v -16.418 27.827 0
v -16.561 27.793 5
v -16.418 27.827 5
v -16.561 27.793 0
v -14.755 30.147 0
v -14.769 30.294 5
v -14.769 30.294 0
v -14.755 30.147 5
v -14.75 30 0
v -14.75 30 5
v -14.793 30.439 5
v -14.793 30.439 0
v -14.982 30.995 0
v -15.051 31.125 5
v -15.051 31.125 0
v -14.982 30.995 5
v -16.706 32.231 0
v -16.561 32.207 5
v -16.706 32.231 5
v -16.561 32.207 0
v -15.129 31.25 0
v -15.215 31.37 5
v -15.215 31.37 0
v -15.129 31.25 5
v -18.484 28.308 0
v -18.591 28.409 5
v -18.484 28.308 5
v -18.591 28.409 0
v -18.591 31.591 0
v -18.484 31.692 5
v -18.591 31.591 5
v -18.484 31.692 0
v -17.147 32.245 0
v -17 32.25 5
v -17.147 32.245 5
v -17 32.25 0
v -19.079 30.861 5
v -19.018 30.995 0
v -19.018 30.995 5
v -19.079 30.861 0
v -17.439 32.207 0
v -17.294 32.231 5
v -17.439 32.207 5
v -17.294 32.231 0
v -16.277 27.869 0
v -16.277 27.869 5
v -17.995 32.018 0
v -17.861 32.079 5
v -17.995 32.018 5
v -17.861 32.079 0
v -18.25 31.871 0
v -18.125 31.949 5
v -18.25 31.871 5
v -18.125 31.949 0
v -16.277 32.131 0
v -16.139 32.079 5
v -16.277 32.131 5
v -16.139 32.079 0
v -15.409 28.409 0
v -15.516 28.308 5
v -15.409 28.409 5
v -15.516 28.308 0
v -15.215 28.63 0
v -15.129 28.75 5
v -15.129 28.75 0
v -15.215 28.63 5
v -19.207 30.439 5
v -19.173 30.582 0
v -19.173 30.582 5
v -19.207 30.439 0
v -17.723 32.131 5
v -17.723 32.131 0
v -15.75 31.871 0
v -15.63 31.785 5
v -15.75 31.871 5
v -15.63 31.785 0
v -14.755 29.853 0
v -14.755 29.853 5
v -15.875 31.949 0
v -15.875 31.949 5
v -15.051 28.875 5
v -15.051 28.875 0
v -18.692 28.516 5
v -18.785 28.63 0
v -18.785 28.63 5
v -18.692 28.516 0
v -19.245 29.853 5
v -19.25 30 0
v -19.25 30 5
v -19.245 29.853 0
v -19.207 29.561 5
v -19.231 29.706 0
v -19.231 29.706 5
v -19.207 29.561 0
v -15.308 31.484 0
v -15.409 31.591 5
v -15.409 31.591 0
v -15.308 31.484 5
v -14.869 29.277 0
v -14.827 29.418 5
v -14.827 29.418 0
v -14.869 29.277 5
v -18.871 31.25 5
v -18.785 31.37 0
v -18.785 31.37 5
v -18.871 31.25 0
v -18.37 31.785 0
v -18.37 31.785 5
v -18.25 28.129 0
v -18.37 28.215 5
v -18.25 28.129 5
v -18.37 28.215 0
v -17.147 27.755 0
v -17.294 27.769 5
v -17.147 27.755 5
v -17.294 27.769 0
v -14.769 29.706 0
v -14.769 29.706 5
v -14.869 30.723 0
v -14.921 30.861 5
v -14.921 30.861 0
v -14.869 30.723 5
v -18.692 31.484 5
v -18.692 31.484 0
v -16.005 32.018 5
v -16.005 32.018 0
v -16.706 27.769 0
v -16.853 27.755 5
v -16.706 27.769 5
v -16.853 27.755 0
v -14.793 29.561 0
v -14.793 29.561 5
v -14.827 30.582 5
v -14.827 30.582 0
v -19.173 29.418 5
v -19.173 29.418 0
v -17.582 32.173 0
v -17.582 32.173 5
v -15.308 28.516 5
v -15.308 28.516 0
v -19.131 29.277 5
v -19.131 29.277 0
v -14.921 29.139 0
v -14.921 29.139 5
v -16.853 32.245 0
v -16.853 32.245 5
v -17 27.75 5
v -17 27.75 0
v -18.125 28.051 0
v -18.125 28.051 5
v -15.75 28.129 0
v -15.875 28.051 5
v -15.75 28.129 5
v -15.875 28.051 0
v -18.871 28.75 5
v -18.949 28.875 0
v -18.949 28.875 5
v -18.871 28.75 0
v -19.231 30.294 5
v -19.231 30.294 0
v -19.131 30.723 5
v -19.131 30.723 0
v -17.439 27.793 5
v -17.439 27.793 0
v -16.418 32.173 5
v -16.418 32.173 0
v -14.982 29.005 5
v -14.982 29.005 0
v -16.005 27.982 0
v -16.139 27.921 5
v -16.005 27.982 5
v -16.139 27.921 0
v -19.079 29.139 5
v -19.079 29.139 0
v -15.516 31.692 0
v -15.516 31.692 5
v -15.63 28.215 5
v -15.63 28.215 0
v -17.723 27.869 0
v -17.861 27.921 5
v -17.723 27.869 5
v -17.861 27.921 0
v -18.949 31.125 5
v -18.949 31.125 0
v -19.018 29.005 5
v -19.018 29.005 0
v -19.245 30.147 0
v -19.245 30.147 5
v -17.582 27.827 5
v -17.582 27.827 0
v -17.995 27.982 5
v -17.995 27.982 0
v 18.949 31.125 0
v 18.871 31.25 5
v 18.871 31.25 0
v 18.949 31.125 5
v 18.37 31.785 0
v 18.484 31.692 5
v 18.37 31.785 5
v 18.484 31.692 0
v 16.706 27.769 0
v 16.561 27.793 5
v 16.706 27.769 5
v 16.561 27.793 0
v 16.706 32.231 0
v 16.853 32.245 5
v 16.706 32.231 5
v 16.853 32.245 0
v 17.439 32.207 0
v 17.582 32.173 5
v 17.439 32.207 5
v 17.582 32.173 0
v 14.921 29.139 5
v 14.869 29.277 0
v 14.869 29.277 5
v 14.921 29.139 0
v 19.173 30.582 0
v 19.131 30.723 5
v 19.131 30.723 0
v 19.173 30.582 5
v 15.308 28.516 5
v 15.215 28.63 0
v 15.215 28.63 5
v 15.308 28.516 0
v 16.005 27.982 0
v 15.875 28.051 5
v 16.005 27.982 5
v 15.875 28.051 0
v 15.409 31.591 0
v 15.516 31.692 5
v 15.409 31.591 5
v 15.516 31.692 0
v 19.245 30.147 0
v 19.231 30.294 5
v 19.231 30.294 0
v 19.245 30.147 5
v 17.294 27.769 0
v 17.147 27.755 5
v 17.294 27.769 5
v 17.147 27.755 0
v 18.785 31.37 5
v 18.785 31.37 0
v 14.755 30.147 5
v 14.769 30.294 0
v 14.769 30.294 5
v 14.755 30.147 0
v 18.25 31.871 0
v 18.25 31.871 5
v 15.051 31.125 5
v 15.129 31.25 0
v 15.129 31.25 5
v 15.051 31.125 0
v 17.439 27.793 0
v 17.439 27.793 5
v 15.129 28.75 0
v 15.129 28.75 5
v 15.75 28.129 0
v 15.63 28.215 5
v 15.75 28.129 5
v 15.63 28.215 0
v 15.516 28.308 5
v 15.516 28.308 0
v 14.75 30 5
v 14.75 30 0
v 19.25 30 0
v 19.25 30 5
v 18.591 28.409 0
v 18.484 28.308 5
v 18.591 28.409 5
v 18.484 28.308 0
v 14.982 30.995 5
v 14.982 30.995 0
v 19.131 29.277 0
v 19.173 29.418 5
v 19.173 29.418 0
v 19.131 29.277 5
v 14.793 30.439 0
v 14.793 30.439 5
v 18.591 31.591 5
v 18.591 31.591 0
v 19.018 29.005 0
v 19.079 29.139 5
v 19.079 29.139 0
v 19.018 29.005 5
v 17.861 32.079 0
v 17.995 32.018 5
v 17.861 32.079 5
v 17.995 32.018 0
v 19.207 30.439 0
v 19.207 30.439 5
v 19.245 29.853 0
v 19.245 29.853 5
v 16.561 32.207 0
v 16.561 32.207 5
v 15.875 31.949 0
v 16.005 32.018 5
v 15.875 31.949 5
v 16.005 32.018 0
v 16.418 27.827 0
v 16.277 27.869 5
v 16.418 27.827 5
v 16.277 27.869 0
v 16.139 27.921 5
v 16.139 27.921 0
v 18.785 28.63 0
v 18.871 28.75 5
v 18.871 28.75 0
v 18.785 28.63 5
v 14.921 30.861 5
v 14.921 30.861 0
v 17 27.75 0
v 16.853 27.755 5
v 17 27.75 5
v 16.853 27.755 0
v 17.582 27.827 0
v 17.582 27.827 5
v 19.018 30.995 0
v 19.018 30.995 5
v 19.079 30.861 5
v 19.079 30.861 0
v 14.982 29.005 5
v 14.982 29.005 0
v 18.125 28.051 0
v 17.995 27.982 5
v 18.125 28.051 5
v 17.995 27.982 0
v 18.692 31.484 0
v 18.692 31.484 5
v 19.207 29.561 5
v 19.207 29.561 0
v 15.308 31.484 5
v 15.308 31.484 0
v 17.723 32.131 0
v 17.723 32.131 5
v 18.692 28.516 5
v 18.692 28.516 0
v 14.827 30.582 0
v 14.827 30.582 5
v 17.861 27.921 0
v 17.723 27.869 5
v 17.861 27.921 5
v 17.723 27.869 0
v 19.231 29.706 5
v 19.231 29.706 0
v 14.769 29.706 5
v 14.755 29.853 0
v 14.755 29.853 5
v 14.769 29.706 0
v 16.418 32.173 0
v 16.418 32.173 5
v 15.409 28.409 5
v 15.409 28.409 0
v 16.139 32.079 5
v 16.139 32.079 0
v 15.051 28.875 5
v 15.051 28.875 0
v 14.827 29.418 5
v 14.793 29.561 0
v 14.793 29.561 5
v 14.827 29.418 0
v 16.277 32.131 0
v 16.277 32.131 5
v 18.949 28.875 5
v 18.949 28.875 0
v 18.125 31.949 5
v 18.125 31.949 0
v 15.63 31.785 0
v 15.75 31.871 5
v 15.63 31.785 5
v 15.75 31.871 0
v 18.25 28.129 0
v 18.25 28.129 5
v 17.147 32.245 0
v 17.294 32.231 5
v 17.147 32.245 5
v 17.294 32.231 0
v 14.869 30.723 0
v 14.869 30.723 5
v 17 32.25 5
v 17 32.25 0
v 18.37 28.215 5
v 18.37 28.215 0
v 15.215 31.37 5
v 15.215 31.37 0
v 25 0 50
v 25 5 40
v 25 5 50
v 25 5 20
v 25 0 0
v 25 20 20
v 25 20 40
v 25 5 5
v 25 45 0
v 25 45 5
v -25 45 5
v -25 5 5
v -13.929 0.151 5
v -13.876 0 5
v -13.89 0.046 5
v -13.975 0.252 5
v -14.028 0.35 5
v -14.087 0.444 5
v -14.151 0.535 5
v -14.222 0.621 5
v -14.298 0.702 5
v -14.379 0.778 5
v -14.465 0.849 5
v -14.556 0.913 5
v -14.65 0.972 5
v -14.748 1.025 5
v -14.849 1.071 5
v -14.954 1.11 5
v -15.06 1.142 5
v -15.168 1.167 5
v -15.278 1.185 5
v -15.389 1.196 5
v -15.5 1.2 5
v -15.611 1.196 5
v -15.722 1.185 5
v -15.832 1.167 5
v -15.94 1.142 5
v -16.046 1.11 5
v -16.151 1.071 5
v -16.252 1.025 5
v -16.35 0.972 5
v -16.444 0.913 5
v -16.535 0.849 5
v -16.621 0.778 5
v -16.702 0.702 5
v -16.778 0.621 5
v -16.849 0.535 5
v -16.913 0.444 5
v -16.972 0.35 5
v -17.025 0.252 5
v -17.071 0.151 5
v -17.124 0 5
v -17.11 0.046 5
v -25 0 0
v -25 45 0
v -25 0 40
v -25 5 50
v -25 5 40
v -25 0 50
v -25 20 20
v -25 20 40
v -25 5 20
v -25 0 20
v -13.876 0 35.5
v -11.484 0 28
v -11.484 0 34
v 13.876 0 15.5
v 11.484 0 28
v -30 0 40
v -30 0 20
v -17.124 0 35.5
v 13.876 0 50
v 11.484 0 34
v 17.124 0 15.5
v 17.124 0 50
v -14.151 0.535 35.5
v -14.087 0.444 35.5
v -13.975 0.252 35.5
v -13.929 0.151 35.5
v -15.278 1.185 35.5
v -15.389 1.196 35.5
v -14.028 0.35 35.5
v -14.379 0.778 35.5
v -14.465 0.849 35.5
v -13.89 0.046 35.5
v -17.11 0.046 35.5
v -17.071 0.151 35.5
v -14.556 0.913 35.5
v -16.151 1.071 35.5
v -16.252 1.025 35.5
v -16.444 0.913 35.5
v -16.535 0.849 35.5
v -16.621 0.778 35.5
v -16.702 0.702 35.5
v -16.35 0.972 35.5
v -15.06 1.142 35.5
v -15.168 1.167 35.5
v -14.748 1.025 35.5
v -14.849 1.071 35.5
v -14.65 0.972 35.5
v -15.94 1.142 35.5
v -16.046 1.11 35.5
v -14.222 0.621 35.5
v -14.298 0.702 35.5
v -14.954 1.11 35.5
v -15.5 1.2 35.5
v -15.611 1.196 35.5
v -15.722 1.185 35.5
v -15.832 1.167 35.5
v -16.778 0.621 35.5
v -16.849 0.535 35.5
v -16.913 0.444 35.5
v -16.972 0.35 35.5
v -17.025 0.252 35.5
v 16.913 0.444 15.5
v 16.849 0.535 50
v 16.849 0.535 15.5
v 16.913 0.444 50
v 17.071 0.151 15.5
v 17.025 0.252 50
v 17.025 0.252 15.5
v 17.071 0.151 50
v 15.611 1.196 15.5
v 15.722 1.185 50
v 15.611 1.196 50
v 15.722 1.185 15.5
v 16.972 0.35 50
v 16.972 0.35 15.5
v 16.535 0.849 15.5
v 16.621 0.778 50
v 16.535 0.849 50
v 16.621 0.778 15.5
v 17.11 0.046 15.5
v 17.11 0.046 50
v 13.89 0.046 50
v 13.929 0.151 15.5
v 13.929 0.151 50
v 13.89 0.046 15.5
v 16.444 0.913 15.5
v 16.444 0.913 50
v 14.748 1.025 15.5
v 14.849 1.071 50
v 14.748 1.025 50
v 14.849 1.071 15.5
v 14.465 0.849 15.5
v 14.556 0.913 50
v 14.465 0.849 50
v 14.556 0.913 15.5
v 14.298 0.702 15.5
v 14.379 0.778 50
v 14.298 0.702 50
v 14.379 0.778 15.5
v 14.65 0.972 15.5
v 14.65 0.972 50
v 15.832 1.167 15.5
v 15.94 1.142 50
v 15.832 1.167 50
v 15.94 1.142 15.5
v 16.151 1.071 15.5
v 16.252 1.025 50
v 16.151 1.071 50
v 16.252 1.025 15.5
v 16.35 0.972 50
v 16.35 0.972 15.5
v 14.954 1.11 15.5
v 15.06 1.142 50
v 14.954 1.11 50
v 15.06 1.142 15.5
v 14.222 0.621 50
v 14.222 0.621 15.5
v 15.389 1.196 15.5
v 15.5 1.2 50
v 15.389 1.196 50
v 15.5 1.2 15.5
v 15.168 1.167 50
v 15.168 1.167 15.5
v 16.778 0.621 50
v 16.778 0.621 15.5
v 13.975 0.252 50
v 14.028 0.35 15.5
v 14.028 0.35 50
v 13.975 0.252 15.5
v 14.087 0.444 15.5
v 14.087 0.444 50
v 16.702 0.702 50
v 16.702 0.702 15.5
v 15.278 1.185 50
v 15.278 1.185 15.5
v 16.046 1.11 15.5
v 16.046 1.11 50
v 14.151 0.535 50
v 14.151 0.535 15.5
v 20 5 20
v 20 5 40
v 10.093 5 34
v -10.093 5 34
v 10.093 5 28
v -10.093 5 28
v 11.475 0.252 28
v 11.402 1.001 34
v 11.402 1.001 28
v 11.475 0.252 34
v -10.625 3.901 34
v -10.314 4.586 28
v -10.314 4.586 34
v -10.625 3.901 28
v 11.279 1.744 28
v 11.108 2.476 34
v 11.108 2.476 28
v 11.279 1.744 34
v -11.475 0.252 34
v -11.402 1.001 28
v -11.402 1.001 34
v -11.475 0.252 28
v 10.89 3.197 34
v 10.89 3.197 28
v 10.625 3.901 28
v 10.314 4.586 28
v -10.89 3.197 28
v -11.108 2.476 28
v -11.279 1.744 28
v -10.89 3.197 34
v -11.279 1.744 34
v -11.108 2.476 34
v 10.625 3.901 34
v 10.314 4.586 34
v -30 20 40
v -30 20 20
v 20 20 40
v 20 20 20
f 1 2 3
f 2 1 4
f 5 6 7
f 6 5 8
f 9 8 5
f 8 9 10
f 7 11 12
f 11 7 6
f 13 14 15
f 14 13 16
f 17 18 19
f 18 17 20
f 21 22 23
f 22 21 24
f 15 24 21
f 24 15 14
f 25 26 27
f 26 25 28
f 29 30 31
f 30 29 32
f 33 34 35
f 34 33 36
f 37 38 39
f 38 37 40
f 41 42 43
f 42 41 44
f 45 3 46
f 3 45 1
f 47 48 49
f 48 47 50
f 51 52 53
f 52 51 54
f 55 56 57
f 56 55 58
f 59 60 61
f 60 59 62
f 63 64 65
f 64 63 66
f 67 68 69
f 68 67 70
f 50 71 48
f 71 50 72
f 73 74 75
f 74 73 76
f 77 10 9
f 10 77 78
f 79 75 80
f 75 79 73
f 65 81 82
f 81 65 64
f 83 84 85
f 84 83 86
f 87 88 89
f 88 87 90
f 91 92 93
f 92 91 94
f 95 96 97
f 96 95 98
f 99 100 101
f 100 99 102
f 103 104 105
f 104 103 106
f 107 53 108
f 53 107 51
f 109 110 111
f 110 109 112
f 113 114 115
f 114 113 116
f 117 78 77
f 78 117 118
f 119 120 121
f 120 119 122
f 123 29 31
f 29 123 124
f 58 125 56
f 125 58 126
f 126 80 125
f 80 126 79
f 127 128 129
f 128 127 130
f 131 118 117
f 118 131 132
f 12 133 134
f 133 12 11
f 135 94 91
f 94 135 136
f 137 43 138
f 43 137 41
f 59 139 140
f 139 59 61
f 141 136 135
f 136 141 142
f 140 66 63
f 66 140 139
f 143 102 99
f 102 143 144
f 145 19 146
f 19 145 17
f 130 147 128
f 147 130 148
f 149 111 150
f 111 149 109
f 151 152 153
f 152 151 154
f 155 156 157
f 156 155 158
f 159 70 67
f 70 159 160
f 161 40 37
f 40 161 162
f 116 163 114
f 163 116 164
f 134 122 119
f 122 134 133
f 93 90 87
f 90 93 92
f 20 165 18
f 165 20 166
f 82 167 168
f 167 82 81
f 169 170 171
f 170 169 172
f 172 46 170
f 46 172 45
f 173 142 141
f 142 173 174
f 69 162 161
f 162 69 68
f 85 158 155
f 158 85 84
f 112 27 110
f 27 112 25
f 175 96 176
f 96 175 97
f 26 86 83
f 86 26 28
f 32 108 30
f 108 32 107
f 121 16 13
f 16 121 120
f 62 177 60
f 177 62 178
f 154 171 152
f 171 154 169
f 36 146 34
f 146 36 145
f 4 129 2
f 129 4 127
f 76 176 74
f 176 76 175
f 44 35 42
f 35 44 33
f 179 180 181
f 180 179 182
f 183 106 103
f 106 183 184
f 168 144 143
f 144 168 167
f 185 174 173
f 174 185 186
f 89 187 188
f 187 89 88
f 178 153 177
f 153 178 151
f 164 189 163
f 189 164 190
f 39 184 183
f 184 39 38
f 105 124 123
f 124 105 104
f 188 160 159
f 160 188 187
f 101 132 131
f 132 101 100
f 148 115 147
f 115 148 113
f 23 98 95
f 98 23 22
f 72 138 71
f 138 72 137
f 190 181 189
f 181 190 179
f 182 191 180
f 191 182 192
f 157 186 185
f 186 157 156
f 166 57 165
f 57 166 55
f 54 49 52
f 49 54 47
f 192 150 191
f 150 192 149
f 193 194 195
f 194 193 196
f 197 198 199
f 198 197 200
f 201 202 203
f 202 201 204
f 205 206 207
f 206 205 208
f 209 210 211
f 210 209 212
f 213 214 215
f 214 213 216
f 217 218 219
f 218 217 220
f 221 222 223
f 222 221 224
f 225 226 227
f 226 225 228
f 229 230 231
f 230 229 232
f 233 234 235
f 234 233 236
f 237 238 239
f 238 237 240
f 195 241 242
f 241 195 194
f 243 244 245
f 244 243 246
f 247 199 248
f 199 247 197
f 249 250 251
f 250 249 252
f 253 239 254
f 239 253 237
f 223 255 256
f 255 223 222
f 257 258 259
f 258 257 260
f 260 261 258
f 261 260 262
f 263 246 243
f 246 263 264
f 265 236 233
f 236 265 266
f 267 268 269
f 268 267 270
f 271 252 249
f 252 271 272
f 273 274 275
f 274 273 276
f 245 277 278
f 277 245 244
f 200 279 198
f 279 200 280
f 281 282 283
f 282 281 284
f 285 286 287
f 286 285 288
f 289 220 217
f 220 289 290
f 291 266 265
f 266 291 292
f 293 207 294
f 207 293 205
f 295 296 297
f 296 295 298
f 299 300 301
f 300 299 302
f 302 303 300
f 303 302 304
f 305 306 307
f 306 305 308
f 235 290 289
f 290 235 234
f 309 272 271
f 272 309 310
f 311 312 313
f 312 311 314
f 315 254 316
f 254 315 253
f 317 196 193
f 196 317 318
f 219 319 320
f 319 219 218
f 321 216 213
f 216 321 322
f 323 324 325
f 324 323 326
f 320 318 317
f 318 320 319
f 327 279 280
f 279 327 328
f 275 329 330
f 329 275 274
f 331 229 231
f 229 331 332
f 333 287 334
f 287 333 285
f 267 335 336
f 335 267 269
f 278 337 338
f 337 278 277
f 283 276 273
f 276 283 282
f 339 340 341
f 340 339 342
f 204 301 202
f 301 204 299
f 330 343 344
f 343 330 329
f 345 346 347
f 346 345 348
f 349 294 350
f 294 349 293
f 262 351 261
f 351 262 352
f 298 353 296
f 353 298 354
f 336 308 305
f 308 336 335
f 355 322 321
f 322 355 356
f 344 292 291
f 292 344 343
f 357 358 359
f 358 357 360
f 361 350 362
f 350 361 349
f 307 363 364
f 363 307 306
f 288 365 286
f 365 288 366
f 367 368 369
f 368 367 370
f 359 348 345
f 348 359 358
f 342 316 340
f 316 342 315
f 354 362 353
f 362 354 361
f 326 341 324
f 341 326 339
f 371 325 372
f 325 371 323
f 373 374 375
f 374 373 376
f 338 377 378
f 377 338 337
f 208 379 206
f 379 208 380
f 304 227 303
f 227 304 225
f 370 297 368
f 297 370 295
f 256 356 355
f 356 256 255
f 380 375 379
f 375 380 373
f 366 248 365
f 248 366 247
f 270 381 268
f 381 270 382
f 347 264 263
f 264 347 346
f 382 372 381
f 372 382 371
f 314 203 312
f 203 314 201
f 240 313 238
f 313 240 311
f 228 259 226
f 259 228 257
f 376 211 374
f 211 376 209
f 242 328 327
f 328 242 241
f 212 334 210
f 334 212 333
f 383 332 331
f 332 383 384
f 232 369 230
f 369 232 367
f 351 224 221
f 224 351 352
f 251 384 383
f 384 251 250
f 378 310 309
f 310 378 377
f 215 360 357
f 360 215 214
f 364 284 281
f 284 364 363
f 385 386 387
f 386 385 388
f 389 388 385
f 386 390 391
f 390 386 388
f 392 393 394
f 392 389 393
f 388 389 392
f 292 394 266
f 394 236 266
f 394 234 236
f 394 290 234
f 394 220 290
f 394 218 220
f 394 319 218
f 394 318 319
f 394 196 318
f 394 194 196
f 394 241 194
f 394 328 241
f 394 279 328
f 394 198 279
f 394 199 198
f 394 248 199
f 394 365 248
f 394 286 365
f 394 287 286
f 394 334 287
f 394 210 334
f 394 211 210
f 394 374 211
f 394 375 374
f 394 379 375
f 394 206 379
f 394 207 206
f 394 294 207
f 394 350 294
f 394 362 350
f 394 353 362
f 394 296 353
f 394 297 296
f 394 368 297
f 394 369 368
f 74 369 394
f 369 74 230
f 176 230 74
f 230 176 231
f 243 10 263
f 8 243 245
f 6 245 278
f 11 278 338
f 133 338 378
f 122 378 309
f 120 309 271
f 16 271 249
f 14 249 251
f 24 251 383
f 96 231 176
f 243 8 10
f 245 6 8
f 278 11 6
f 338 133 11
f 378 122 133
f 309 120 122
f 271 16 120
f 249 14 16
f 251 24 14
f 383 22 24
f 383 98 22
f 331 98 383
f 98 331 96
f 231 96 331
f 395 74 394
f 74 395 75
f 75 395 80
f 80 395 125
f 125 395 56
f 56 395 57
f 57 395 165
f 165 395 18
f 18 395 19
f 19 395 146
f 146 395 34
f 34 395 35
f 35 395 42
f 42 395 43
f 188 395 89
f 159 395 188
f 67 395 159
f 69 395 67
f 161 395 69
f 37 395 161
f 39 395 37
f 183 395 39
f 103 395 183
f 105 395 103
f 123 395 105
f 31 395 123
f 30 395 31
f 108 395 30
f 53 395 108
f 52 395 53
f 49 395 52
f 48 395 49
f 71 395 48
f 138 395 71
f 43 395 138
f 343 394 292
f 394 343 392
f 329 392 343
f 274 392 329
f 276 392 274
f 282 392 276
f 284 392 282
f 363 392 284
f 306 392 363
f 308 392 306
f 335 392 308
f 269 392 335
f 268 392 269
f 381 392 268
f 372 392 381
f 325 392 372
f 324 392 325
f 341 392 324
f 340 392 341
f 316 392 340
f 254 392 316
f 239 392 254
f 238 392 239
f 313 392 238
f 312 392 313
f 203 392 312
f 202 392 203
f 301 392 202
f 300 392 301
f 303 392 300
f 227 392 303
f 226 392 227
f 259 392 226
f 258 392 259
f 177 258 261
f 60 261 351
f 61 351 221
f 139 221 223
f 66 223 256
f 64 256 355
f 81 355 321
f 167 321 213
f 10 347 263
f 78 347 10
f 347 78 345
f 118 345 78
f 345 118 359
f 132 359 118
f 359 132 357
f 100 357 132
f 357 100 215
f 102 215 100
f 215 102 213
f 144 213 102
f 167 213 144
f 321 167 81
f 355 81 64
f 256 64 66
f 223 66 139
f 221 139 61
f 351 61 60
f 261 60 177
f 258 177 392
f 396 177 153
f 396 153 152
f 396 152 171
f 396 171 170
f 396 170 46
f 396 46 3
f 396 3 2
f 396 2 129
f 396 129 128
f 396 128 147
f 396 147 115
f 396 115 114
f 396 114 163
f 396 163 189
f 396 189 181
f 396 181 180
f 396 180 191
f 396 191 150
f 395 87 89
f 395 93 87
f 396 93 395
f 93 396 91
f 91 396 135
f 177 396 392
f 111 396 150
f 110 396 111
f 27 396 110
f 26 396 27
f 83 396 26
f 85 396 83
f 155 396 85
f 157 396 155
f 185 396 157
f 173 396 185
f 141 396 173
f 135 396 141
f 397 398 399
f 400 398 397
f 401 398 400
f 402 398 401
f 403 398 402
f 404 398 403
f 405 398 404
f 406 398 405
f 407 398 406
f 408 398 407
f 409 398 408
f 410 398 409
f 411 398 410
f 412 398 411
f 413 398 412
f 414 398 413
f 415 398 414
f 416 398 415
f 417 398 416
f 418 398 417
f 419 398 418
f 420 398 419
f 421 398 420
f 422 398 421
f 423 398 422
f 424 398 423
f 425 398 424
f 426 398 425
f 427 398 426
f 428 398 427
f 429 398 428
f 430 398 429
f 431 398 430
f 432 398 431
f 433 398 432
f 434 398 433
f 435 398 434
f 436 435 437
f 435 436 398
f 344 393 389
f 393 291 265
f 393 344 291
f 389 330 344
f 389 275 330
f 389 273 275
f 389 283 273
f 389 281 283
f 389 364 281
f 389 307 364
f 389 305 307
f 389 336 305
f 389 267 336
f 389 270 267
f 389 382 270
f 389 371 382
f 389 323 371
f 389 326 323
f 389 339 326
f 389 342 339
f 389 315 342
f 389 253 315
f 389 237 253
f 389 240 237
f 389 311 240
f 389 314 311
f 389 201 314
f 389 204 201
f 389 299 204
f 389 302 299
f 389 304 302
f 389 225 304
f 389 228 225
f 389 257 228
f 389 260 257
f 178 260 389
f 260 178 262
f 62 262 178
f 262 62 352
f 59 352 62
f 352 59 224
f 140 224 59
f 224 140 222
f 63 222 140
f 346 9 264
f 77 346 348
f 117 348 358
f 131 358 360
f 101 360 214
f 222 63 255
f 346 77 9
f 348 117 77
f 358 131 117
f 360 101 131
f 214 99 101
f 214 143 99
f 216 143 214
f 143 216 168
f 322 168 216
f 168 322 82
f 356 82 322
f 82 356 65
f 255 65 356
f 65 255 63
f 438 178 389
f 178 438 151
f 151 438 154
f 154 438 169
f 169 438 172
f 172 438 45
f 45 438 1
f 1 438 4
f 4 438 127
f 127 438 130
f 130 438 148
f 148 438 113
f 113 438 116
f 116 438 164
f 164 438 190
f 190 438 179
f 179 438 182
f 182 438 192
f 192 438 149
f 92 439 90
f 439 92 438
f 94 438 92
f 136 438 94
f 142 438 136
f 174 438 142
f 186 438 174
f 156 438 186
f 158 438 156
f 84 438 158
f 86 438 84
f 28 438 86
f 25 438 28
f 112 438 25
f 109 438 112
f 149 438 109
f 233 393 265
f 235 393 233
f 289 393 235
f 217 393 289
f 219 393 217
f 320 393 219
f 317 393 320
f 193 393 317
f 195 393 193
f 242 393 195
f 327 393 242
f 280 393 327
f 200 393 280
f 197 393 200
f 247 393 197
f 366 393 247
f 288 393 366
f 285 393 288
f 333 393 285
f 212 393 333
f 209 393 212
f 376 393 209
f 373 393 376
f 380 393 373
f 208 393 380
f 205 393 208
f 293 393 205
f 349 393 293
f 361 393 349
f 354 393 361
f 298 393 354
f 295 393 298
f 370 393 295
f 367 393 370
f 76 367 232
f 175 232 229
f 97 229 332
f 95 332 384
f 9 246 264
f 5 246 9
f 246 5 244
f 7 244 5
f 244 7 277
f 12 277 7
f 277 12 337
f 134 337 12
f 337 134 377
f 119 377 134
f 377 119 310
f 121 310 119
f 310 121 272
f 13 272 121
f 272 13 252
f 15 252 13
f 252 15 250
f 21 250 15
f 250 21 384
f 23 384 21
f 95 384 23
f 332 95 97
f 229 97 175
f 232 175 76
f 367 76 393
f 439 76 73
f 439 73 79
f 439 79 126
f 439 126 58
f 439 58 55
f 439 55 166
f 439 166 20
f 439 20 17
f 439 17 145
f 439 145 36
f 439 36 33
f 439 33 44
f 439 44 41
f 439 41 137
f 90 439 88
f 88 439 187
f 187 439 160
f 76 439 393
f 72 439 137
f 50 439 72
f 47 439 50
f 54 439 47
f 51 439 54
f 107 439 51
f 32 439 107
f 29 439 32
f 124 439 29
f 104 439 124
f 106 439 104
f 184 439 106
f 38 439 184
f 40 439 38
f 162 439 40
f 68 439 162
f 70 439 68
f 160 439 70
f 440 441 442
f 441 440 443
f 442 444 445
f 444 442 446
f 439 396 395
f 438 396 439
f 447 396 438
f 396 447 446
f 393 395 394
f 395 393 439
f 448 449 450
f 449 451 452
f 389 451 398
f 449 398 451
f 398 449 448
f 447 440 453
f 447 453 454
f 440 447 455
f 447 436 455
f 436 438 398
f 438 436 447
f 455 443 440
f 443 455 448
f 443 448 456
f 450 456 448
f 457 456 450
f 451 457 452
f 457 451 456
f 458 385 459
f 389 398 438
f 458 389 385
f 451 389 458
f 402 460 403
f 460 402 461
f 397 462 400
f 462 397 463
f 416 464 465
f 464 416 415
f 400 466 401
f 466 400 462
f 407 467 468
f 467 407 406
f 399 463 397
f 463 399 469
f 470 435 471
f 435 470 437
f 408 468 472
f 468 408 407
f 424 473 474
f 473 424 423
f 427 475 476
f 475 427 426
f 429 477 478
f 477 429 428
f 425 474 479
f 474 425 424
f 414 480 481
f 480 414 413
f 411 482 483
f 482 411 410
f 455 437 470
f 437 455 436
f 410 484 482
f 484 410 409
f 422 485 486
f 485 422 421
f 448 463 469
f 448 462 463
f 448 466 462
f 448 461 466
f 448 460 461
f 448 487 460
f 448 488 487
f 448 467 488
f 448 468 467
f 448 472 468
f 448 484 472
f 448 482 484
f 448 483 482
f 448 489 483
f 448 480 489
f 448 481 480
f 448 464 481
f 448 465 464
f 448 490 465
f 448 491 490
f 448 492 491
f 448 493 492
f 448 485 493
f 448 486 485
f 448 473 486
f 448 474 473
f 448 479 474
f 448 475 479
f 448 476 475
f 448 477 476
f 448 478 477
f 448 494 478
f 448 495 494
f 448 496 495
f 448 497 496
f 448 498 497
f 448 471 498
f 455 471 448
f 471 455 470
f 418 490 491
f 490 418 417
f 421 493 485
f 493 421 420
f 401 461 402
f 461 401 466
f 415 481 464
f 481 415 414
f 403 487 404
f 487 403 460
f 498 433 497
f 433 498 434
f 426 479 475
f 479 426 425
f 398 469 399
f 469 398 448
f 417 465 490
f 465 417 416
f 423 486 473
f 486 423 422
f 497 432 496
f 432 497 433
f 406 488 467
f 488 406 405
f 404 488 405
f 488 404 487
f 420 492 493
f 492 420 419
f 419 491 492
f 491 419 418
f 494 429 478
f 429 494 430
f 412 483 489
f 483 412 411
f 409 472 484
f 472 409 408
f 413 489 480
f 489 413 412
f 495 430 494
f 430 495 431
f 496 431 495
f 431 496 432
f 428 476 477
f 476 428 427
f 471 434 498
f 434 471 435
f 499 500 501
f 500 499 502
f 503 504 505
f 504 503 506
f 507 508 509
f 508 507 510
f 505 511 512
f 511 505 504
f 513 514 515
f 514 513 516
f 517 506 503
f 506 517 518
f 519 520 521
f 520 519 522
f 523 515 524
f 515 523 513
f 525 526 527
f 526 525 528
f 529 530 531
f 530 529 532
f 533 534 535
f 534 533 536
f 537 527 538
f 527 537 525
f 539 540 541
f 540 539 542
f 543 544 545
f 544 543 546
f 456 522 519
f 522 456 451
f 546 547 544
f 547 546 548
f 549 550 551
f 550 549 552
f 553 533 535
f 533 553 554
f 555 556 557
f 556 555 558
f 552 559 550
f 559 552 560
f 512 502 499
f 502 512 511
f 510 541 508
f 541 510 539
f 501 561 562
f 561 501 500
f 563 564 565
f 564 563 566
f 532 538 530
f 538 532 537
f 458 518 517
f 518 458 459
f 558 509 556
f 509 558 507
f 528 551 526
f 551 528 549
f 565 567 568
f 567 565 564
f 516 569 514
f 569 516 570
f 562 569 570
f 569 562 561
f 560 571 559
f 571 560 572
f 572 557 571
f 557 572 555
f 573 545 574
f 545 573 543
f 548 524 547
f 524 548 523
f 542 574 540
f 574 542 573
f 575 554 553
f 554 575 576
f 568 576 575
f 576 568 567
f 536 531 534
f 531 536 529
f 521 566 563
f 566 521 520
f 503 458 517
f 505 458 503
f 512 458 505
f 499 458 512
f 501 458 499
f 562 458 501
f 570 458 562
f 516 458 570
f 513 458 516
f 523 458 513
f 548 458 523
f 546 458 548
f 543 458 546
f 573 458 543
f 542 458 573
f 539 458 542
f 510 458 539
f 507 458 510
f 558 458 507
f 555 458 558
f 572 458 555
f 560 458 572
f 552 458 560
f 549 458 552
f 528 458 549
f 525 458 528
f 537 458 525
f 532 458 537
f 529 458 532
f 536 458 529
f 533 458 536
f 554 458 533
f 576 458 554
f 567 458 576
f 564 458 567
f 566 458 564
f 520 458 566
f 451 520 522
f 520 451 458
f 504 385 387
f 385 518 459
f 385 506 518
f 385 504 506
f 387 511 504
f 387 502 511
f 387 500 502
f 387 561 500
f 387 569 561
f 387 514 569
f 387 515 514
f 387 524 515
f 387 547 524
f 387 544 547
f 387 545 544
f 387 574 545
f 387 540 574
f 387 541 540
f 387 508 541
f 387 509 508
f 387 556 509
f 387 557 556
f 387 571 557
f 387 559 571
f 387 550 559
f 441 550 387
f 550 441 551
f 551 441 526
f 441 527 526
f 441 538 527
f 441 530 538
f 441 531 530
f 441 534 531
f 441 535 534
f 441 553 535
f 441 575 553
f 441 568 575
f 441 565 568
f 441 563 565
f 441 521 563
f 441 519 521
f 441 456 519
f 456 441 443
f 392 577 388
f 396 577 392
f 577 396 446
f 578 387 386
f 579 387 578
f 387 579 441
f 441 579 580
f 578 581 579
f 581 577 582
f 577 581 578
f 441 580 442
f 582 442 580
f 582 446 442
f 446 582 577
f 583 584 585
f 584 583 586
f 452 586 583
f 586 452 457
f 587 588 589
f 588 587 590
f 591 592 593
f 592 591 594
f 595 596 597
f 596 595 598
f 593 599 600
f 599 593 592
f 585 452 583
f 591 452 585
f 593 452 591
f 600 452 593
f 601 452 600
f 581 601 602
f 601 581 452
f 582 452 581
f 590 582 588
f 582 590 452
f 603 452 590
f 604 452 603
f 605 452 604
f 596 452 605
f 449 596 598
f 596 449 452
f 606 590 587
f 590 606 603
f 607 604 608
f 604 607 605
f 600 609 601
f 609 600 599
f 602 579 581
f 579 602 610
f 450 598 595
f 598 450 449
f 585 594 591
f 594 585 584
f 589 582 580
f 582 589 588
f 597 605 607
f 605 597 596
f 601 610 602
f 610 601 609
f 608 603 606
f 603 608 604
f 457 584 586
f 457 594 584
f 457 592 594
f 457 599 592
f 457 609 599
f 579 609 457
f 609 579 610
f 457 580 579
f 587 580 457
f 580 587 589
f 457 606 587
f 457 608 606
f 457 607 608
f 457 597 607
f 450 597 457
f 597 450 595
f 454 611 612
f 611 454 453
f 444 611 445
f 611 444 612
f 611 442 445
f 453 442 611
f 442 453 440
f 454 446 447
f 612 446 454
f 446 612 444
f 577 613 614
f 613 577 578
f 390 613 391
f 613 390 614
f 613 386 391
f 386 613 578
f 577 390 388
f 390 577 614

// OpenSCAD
// L-shaped mounting bracket for NEMA 17 stepper motor (e.g. syringe pump)
// Print orientation: base plate on the bed, motor plate building upward.

// ---------------- Parameters ----------------
base_x0      = -25;   // base plate, x start (mm)
base_x1      = 25;    // base plate, x end (mm)
base_y0      = 0;     // base plate, y start (mm)
base_y1      = 45;    // base plate, y end (mm)
base_z0      = 0;     // base plate, z start (mm)
base_z1      = 5;     // base plate, z end (mm)

hole_m4_x    = -17;   // M4 through-hole, x position (mm)
hole_m4_y    = 30;    // M4 through-hole, y position (mm)
hole_m4_d    = 4.5;   // M4 through-hole diameter (mm)

hole_m4_x2   = 17;    // M4 through-hole, x position (mm)
hole_m4_y2   = 30;    // M4 through-hole, y position (mm)
hole_m4_d2   = 4.5;   // M4 through-hole diameter (mm)

motor_x0     = -25;   // motor plate, x start (mm)
motor_x1     = 25;    // motor plate, x end (mm)
motor_y0     = 0;     // motor plate, y start (mm)
motor_y1     = 5;     // motor plate, y end (mm)
motor_z0     = 0;     // motor plate, z start (mm)
motor_z1     = 50;    // motor plate, z end (mm)

boss_d       = 23;    // motor boss hole diameter (mm)
boss_x       = 0;     // motor boss hole, x position (mm)
boss_z       = 28;    // motor boss hole, z position (mm)

screw_d      = 3.4;   // M3 screw hole diameter (mm)
screw_pitch  = 31;    // M3 screw hole pattern size (mm)

gusset_t     = 5;     // gusset thickness (mm)
gusset_leg   = 20;    // gusset leg length (mm)

eps          = 0.5;   // cutter overshoot past faces (mm)

$fn = 96;

// ---------------- Model ----------------
union() {
    // Base plate with two M4 through-holes
    difference() {
        translate([base_x0, base_y0, base_z0])
            cube([base_x1 - base_x0, base_y1 - base_y0, base_z1 - base_z0]);

        for (h = [hole_m4_x, hole_m4_x2]) {
            translate([h, hole_m4_y, -eps])
                cylinder(d = hole_m4_d, h = base_z1 - base_z0 + 2 * eps);
        }
    }

    // Vertical motor plate with boss hole and four M3 screw holes
    difference() {
        translate([motor_x0, motor_y0, motor_z0])
            cube([motor_x1 - motor_x0, motor_y1 - motor_y0, motor_z1 - motor_z0]);

        // Boss hole along Y, centred at x = 0, z = 28
        translate([boss_x, -eps, boss_z])
            cylinder(d = boss_d, h = motor_y1 - motor_y0 + 2 * eps);

        // M3 screw holes on a 31 mm square pattern, centred on the boss
        for (s = [-1, 1])
            for (t = [-1, 1])
                translate([t * screw_pitch / 2, motor_y0 - eps, t * screw_pitch / 2])
                    cylinder(d = screw_d, h = motor_z1 - motor_z0 + 2 * eps);
    }

    // Gusset on the left edge (x = -25 to -20)
    translate([base_x0 - gusset_t, gusset_leg, gusset_leg])
        rotate([90, 0, 0])
            cube([gusset_t, gusset_leg, gusset_leg]);

    // Gusset on the right edge (x = 20 to 25)
    translate([base_x1 - gusset_t, gusset_leg, gusset_leg])
        rotate([90, 0, 0])
            cube([gusset_t, gusset_leg, gusset_leg]);
}
